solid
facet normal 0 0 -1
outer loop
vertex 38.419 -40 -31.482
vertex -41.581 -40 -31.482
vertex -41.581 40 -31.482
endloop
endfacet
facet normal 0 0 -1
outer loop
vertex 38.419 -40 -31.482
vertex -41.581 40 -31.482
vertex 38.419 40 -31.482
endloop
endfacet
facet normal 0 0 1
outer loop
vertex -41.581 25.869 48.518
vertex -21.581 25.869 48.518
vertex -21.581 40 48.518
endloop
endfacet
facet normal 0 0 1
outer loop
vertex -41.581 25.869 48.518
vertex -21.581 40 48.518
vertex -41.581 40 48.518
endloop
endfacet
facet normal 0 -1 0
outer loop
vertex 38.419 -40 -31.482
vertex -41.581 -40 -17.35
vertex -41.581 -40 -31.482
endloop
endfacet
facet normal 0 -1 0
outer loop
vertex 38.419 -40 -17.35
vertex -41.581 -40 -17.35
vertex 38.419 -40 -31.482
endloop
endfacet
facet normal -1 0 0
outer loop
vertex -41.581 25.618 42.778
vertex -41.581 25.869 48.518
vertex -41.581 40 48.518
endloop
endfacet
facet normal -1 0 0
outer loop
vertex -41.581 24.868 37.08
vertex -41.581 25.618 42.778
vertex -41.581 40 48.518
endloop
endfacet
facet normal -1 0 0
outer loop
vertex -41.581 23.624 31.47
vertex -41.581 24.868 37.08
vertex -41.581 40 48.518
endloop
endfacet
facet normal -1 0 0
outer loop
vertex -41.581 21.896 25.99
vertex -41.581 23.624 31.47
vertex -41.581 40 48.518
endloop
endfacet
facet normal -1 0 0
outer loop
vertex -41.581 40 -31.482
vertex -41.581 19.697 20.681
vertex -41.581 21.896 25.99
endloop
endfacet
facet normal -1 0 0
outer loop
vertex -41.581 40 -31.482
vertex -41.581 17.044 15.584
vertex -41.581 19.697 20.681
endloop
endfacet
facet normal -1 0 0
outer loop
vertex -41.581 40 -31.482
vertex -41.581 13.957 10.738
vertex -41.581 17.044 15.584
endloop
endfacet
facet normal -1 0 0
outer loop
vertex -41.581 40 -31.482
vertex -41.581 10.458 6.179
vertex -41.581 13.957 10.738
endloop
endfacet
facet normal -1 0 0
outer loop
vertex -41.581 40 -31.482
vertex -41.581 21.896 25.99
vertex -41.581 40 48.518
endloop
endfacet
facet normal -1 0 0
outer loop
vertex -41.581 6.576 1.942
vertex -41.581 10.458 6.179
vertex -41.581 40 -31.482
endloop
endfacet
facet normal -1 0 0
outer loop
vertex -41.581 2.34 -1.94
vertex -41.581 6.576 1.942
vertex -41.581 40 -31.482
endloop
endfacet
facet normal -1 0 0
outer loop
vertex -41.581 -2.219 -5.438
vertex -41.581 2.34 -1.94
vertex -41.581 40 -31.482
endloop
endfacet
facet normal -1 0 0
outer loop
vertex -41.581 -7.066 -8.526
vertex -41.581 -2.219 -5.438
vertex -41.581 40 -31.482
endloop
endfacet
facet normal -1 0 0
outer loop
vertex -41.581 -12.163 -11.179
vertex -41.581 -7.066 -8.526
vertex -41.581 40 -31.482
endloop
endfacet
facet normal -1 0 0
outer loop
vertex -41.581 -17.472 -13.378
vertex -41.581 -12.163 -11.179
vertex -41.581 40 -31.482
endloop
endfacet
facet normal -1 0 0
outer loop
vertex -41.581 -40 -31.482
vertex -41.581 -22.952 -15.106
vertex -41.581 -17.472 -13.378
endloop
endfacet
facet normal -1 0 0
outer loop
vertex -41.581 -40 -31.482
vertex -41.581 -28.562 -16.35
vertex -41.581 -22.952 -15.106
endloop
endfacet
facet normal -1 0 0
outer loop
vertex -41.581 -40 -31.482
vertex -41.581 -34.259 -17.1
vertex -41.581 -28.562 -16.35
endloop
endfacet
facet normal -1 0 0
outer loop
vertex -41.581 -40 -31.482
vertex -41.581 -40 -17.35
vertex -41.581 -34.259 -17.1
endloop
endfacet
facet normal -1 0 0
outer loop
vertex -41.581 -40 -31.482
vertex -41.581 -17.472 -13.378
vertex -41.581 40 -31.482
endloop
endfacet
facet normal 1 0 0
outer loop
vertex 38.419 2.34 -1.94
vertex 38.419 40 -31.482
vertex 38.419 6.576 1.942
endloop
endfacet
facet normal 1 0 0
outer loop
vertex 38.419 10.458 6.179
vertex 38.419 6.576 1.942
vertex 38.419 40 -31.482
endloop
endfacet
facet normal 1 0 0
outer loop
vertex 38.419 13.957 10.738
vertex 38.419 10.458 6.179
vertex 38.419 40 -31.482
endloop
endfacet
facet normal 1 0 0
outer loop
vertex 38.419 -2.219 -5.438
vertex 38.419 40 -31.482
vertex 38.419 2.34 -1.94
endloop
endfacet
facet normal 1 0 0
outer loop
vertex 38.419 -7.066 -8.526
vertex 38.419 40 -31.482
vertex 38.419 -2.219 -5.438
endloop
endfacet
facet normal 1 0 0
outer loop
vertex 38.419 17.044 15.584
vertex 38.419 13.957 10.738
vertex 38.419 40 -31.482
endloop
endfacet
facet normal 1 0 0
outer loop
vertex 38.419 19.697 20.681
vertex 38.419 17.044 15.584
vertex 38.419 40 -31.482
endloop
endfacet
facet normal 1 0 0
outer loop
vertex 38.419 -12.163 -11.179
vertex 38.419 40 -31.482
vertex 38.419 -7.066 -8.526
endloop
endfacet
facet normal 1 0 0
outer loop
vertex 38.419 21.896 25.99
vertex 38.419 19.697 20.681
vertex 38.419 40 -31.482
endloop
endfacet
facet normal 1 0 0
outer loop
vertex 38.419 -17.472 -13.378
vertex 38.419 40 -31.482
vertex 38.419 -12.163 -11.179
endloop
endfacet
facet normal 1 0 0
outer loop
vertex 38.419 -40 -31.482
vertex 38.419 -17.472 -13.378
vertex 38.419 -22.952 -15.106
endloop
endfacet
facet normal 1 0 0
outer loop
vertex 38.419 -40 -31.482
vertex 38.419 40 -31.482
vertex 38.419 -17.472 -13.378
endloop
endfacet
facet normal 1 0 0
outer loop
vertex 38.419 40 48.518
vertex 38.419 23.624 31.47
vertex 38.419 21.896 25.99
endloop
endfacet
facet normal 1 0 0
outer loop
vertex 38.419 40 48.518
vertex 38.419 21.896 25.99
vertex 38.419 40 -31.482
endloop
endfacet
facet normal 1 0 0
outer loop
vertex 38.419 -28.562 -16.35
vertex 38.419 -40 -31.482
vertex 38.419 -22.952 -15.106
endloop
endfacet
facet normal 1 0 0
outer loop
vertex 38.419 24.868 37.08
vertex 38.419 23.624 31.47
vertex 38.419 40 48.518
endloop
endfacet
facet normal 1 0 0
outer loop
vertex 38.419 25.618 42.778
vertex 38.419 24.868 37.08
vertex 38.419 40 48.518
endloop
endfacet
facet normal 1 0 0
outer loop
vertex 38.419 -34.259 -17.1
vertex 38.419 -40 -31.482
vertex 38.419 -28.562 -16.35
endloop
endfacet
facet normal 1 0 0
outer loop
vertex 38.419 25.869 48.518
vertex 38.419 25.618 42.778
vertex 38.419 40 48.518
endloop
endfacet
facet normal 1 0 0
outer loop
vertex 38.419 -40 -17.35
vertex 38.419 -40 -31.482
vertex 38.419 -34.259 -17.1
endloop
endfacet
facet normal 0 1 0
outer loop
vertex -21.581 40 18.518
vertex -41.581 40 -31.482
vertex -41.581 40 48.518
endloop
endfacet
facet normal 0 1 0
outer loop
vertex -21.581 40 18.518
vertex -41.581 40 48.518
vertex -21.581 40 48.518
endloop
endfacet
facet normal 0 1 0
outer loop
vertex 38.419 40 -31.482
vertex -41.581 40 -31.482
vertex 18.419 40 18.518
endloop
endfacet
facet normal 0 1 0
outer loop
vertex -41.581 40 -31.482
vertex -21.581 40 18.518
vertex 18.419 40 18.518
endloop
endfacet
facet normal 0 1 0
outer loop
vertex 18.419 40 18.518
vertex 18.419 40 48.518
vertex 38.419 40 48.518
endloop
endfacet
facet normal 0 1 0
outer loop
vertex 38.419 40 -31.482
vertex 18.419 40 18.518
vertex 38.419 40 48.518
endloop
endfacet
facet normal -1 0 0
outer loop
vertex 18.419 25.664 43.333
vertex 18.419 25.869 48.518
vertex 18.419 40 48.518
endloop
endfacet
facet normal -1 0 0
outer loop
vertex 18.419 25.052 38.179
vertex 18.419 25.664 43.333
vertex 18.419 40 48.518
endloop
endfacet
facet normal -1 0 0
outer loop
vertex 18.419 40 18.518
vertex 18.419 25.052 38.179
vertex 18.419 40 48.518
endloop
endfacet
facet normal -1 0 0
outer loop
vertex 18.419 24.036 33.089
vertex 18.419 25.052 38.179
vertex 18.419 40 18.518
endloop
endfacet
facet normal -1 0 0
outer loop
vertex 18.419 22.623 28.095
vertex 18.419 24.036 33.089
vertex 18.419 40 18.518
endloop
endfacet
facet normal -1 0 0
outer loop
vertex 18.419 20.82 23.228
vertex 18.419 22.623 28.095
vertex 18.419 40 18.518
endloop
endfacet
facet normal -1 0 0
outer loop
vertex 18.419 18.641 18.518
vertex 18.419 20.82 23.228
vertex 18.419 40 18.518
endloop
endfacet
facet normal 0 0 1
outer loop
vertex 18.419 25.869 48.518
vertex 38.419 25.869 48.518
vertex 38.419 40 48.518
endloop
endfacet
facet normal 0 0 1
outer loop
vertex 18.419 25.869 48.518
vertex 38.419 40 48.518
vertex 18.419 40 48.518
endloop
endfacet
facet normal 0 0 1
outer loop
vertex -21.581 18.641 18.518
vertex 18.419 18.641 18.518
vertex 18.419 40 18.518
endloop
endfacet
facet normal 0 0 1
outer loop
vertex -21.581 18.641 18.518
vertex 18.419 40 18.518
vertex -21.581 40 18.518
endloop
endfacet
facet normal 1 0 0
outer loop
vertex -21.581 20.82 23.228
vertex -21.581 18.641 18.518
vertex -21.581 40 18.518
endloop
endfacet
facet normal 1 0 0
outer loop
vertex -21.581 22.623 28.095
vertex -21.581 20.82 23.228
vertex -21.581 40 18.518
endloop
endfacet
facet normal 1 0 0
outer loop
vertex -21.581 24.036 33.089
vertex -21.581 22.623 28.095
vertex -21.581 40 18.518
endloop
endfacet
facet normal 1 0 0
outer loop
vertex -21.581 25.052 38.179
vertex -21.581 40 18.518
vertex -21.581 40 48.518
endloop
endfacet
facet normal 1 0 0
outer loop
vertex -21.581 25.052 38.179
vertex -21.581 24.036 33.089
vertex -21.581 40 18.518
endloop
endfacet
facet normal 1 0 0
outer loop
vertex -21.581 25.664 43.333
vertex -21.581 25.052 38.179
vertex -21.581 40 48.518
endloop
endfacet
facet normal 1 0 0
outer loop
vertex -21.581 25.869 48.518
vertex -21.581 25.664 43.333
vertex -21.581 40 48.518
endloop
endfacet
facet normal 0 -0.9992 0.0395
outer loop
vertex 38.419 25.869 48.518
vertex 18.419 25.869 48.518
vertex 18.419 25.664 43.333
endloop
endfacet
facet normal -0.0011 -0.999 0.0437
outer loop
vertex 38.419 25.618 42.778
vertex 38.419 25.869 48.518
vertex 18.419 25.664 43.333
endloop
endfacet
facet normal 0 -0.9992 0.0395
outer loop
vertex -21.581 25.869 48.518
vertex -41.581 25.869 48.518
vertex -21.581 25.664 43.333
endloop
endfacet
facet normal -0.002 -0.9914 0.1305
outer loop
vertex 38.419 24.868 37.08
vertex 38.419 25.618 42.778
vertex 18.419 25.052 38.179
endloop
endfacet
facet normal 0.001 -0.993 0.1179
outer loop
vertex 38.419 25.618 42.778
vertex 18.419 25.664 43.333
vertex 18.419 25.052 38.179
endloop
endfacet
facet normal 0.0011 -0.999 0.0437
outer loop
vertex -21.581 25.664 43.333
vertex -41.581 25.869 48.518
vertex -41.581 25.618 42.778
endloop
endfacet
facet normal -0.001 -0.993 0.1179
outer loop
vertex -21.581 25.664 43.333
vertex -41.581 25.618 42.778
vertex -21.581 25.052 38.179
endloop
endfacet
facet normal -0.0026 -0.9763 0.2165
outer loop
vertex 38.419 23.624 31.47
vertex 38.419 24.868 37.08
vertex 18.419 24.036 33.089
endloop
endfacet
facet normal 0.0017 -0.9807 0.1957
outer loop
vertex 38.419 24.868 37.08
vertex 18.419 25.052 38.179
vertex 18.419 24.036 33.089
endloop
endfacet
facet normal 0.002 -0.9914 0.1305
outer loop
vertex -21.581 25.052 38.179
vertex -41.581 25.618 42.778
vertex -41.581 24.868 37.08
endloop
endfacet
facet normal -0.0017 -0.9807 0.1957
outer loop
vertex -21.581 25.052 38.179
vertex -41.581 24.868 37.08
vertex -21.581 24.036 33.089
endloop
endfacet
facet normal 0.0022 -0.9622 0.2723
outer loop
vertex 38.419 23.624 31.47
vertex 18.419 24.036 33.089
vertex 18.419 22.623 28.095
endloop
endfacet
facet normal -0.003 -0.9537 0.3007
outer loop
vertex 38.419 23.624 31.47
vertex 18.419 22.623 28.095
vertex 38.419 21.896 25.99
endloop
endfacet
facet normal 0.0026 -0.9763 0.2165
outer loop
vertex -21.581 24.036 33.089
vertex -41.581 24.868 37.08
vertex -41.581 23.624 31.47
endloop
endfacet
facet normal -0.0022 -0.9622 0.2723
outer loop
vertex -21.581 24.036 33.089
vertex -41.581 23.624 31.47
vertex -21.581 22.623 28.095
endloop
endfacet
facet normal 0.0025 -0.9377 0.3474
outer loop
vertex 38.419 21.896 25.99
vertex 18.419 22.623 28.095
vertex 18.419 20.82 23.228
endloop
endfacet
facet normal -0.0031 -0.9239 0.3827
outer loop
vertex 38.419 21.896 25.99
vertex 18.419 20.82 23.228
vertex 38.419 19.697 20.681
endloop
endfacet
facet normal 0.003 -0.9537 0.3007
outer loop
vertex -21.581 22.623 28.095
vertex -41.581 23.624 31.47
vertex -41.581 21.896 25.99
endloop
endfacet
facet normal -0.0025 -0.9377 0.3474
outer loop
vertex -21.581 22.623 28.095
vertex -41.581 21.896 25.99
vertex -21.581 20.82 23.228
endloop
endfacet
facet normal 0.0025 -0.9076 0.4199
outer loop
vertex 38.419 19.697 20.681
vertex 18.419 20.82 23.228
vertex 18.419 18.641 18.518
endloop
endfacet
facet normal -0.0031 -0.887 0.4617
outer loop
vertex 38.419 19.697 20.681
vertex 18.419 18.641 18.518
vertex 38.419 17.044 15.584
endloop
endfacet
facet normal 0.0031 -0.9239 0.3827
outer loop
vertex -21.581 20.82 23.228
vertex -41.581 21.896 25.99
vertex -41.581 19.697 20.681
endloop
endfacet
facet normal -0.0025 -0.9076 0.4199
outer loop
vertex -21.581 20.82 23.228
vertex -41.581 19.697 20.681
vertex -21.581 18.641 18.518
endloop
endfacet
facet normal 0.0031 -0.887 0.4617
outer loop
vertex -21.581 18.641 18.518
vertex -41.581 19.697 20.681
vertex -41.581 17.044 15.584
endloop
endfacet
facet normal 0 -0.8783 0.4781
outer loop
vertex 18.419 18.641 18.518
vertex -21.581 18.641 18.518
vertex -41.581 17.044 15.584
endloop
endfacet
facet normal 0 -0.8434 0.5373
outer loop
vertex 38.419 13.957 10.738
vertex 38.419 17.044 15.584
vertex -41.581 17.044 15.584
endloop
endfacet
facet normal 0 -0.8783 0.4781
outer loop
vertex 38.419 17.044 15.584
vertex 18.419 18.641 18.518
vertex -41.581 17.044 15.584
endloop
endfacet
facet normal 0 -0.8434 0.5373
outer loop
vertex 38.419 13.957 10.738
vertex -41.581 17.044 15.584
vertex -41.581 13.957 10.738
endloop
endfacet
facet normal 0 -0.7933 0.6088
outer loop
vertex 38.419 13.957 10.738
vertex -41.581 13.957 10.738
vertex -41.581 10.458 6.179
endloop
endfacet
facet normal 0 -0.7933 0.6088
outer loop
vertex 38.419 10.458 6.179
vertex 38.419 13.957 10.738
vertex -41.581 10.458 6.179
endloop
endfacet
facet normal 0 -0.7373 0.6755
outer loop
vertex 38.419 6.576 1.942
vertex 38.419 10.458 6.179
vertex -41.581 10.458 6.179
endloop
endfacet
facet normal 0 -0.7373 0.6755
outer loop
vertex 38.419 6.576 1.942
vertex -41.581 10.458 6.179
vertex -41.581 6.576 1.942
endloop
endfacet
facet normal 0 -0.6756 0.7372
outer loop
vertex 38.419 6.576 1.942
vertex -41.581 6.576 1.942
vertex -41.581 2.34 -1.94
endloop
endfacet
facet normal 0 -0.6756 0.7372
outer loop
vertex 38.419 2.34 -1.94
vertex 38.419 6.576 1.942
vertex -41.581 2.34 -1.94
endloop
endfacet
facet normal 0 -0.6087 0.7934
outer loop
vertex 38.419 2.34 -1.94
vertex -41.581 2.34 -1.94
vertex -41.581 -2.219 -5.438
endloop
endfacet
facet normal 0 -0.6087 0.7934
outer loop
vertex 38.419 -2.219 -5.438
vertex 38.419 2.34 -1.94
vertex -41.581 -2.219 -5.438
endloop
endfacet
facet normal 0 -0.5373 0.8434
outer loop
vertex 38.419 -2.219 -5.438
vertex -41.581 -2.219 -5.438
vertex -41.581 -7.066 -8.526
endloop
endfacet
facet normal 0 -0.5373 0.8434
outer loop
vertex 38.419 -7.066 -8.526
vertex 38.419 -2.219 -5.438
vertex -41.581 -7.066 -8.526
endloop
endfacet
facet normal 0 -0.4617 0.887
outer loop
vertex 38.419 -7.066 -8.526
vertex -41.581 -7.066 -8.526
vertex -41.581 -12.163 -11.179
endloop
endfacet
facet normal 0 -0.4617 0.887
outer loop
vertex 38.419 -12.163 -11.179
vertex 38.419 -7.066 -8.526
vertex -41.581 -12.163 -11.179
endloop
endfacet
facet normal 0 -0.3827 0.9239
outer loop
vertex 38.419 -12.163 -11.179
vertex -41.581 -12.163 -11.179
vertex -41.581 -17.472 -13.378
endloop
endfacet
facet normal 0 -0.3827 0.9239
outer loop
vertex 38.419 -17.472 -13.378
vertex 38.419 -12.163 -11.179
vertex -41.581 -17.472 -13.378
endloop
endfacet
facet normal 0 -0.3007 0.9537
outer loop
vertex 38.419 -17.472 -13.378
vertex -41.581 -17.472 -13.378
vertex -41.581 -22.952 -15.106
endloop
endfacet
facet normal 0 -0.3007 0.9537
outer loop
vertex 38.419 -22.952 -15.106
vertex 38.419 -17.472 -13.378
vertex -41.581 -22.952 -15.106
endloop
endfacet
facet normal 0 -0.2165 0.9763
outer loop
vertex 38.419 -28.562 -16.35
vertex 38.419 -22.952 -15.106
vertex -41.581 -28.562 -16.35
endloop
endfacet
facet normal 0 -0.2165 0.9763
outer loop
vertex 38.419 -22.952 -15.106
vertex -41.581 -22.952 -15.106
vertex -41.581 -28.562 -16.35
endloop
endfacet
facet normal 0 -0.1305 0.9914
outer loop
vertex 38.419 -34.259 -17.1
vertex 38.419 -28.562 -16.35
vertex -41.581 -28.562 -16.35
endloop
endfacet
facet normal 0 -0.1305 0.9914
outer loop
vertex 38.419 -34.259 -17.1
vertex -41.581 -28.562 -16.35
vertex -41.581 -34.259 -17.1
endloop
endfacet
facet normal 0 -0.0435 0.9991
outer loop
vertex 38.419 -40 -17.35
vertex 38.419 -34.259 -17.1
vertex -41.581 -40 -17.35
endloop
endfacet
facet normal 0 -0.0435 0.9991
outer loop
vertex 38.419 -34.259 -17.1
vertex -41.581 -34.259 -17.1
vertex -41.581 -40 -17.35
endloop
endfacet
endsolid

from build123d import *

# Parameters (mm, degrees)
F1_DEPTH = 40
F3_DEPTH = 80.001


with BuildPart() as f1:
    # F0 (on Front) → F1 (new body, symmetric)
    with BuildSketch(Plane.XZ):
        Polygon((-21.581216, 48.518489), (-41.581216, 48.518489), (-41.581216, -31.481511), (38.418784, -31.481511), (38.418784, 48.518489), (18.418784, 48.518489), (18.418784, 18.518489), (-21.581216, 18.518489), align=None)
    extrude(amount=F1_DEPTH, both=True)

    # F2 (on face) → F3 (cut, through all)
    with BuildSketch(Plane(origin=(-41.581216, 0, 0), x_dir=(0, -1, 0), z_dir=(-1, 0, 0))):
        with BuildLine():
            Line((40, -17.350387), (40, -15.578494))
            Line((40, -15.578494), (40, 48.518489))
            Line((40, 48.518489), (-25.868876, 48.518489))
            ThreePointArc((-25.868876, 48.518489), (-6.576329, 1.94216), (40, -17.350387))
        make_face()
    extrude(amount=-F3_DEPTH, mode=Mode.SUBTRACT)


solid = f1.part
